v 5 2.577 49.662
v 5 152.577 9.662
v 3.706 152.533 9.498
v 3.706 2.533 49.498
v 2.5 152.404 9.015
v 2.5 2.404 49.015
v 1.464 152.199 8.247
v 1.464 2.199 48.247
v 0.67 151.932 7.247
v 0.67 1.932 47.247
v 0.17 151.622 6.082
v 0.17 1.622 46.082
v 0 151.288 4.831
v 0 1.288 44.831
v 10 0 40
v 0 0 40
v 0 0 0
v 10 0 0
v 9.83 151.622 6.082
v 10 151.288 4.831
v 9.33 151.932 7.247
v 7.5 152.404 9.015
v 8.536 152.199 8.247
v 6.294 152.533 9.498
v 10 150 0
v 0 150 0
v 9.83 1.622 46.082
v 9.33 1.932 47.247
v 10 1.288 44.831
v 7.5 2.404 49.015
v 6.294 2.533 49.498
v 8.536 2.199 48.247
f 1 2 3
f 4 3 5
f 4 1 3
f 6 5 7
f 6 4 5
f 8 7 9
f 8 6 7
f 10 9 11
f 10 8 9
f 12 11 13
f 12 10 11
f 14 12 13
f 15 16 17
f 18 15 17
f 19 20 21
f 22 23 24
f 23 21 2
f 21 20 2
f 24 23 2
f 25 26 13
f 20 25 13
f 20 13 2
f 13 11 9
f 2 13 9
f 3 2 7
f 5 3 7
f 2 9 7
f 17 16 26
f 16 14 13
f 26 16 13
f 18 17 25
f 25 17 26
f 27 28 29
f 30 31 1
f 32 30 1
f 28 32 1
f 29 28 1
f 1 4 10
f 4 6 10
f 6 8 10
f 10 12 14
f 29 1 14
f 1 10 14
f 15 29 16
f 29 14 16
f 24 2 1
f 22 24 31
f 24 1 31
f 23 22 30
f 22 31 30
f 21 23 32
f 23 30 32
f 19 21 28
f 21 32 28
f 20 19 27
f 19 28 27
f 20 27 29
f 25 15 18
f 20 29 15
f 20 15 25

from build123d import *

# Parameters (mm, degrees)
F1_DEPTH = 10
F2_R     = 4.99999


# Not quite as in the source:
# - a fillet or chamfer is up to 0.001 mm smaller than in the source, because OpenCascade refuses the exact size


with BuildPart() as f1:
    # F0 (on Right) → F1 (new body)
    with BuildSketch(Plane.YZ):
        Polygon((0, 40), (0, 0), (150, 0), align=None)
        Polygon((2.5766265056, 49.662349396), (0, 40), (150, 0), (152.5766265056, 9.662349396), align=None)
    extrude(amount=F1_DEPTH)

    # F2 (radius 5 in the source; OpenCascade refuses exactly that, so slightly less here)
    f2_edges = [f1.edges().sort_by_distance(p)[0] for p in [
        (0, 77.576627, 29.662349),
        (10, 77.576627, 29.662349),
    ]]
    fillet(f2_edges, radius=F2_R)


solid = f1.part
